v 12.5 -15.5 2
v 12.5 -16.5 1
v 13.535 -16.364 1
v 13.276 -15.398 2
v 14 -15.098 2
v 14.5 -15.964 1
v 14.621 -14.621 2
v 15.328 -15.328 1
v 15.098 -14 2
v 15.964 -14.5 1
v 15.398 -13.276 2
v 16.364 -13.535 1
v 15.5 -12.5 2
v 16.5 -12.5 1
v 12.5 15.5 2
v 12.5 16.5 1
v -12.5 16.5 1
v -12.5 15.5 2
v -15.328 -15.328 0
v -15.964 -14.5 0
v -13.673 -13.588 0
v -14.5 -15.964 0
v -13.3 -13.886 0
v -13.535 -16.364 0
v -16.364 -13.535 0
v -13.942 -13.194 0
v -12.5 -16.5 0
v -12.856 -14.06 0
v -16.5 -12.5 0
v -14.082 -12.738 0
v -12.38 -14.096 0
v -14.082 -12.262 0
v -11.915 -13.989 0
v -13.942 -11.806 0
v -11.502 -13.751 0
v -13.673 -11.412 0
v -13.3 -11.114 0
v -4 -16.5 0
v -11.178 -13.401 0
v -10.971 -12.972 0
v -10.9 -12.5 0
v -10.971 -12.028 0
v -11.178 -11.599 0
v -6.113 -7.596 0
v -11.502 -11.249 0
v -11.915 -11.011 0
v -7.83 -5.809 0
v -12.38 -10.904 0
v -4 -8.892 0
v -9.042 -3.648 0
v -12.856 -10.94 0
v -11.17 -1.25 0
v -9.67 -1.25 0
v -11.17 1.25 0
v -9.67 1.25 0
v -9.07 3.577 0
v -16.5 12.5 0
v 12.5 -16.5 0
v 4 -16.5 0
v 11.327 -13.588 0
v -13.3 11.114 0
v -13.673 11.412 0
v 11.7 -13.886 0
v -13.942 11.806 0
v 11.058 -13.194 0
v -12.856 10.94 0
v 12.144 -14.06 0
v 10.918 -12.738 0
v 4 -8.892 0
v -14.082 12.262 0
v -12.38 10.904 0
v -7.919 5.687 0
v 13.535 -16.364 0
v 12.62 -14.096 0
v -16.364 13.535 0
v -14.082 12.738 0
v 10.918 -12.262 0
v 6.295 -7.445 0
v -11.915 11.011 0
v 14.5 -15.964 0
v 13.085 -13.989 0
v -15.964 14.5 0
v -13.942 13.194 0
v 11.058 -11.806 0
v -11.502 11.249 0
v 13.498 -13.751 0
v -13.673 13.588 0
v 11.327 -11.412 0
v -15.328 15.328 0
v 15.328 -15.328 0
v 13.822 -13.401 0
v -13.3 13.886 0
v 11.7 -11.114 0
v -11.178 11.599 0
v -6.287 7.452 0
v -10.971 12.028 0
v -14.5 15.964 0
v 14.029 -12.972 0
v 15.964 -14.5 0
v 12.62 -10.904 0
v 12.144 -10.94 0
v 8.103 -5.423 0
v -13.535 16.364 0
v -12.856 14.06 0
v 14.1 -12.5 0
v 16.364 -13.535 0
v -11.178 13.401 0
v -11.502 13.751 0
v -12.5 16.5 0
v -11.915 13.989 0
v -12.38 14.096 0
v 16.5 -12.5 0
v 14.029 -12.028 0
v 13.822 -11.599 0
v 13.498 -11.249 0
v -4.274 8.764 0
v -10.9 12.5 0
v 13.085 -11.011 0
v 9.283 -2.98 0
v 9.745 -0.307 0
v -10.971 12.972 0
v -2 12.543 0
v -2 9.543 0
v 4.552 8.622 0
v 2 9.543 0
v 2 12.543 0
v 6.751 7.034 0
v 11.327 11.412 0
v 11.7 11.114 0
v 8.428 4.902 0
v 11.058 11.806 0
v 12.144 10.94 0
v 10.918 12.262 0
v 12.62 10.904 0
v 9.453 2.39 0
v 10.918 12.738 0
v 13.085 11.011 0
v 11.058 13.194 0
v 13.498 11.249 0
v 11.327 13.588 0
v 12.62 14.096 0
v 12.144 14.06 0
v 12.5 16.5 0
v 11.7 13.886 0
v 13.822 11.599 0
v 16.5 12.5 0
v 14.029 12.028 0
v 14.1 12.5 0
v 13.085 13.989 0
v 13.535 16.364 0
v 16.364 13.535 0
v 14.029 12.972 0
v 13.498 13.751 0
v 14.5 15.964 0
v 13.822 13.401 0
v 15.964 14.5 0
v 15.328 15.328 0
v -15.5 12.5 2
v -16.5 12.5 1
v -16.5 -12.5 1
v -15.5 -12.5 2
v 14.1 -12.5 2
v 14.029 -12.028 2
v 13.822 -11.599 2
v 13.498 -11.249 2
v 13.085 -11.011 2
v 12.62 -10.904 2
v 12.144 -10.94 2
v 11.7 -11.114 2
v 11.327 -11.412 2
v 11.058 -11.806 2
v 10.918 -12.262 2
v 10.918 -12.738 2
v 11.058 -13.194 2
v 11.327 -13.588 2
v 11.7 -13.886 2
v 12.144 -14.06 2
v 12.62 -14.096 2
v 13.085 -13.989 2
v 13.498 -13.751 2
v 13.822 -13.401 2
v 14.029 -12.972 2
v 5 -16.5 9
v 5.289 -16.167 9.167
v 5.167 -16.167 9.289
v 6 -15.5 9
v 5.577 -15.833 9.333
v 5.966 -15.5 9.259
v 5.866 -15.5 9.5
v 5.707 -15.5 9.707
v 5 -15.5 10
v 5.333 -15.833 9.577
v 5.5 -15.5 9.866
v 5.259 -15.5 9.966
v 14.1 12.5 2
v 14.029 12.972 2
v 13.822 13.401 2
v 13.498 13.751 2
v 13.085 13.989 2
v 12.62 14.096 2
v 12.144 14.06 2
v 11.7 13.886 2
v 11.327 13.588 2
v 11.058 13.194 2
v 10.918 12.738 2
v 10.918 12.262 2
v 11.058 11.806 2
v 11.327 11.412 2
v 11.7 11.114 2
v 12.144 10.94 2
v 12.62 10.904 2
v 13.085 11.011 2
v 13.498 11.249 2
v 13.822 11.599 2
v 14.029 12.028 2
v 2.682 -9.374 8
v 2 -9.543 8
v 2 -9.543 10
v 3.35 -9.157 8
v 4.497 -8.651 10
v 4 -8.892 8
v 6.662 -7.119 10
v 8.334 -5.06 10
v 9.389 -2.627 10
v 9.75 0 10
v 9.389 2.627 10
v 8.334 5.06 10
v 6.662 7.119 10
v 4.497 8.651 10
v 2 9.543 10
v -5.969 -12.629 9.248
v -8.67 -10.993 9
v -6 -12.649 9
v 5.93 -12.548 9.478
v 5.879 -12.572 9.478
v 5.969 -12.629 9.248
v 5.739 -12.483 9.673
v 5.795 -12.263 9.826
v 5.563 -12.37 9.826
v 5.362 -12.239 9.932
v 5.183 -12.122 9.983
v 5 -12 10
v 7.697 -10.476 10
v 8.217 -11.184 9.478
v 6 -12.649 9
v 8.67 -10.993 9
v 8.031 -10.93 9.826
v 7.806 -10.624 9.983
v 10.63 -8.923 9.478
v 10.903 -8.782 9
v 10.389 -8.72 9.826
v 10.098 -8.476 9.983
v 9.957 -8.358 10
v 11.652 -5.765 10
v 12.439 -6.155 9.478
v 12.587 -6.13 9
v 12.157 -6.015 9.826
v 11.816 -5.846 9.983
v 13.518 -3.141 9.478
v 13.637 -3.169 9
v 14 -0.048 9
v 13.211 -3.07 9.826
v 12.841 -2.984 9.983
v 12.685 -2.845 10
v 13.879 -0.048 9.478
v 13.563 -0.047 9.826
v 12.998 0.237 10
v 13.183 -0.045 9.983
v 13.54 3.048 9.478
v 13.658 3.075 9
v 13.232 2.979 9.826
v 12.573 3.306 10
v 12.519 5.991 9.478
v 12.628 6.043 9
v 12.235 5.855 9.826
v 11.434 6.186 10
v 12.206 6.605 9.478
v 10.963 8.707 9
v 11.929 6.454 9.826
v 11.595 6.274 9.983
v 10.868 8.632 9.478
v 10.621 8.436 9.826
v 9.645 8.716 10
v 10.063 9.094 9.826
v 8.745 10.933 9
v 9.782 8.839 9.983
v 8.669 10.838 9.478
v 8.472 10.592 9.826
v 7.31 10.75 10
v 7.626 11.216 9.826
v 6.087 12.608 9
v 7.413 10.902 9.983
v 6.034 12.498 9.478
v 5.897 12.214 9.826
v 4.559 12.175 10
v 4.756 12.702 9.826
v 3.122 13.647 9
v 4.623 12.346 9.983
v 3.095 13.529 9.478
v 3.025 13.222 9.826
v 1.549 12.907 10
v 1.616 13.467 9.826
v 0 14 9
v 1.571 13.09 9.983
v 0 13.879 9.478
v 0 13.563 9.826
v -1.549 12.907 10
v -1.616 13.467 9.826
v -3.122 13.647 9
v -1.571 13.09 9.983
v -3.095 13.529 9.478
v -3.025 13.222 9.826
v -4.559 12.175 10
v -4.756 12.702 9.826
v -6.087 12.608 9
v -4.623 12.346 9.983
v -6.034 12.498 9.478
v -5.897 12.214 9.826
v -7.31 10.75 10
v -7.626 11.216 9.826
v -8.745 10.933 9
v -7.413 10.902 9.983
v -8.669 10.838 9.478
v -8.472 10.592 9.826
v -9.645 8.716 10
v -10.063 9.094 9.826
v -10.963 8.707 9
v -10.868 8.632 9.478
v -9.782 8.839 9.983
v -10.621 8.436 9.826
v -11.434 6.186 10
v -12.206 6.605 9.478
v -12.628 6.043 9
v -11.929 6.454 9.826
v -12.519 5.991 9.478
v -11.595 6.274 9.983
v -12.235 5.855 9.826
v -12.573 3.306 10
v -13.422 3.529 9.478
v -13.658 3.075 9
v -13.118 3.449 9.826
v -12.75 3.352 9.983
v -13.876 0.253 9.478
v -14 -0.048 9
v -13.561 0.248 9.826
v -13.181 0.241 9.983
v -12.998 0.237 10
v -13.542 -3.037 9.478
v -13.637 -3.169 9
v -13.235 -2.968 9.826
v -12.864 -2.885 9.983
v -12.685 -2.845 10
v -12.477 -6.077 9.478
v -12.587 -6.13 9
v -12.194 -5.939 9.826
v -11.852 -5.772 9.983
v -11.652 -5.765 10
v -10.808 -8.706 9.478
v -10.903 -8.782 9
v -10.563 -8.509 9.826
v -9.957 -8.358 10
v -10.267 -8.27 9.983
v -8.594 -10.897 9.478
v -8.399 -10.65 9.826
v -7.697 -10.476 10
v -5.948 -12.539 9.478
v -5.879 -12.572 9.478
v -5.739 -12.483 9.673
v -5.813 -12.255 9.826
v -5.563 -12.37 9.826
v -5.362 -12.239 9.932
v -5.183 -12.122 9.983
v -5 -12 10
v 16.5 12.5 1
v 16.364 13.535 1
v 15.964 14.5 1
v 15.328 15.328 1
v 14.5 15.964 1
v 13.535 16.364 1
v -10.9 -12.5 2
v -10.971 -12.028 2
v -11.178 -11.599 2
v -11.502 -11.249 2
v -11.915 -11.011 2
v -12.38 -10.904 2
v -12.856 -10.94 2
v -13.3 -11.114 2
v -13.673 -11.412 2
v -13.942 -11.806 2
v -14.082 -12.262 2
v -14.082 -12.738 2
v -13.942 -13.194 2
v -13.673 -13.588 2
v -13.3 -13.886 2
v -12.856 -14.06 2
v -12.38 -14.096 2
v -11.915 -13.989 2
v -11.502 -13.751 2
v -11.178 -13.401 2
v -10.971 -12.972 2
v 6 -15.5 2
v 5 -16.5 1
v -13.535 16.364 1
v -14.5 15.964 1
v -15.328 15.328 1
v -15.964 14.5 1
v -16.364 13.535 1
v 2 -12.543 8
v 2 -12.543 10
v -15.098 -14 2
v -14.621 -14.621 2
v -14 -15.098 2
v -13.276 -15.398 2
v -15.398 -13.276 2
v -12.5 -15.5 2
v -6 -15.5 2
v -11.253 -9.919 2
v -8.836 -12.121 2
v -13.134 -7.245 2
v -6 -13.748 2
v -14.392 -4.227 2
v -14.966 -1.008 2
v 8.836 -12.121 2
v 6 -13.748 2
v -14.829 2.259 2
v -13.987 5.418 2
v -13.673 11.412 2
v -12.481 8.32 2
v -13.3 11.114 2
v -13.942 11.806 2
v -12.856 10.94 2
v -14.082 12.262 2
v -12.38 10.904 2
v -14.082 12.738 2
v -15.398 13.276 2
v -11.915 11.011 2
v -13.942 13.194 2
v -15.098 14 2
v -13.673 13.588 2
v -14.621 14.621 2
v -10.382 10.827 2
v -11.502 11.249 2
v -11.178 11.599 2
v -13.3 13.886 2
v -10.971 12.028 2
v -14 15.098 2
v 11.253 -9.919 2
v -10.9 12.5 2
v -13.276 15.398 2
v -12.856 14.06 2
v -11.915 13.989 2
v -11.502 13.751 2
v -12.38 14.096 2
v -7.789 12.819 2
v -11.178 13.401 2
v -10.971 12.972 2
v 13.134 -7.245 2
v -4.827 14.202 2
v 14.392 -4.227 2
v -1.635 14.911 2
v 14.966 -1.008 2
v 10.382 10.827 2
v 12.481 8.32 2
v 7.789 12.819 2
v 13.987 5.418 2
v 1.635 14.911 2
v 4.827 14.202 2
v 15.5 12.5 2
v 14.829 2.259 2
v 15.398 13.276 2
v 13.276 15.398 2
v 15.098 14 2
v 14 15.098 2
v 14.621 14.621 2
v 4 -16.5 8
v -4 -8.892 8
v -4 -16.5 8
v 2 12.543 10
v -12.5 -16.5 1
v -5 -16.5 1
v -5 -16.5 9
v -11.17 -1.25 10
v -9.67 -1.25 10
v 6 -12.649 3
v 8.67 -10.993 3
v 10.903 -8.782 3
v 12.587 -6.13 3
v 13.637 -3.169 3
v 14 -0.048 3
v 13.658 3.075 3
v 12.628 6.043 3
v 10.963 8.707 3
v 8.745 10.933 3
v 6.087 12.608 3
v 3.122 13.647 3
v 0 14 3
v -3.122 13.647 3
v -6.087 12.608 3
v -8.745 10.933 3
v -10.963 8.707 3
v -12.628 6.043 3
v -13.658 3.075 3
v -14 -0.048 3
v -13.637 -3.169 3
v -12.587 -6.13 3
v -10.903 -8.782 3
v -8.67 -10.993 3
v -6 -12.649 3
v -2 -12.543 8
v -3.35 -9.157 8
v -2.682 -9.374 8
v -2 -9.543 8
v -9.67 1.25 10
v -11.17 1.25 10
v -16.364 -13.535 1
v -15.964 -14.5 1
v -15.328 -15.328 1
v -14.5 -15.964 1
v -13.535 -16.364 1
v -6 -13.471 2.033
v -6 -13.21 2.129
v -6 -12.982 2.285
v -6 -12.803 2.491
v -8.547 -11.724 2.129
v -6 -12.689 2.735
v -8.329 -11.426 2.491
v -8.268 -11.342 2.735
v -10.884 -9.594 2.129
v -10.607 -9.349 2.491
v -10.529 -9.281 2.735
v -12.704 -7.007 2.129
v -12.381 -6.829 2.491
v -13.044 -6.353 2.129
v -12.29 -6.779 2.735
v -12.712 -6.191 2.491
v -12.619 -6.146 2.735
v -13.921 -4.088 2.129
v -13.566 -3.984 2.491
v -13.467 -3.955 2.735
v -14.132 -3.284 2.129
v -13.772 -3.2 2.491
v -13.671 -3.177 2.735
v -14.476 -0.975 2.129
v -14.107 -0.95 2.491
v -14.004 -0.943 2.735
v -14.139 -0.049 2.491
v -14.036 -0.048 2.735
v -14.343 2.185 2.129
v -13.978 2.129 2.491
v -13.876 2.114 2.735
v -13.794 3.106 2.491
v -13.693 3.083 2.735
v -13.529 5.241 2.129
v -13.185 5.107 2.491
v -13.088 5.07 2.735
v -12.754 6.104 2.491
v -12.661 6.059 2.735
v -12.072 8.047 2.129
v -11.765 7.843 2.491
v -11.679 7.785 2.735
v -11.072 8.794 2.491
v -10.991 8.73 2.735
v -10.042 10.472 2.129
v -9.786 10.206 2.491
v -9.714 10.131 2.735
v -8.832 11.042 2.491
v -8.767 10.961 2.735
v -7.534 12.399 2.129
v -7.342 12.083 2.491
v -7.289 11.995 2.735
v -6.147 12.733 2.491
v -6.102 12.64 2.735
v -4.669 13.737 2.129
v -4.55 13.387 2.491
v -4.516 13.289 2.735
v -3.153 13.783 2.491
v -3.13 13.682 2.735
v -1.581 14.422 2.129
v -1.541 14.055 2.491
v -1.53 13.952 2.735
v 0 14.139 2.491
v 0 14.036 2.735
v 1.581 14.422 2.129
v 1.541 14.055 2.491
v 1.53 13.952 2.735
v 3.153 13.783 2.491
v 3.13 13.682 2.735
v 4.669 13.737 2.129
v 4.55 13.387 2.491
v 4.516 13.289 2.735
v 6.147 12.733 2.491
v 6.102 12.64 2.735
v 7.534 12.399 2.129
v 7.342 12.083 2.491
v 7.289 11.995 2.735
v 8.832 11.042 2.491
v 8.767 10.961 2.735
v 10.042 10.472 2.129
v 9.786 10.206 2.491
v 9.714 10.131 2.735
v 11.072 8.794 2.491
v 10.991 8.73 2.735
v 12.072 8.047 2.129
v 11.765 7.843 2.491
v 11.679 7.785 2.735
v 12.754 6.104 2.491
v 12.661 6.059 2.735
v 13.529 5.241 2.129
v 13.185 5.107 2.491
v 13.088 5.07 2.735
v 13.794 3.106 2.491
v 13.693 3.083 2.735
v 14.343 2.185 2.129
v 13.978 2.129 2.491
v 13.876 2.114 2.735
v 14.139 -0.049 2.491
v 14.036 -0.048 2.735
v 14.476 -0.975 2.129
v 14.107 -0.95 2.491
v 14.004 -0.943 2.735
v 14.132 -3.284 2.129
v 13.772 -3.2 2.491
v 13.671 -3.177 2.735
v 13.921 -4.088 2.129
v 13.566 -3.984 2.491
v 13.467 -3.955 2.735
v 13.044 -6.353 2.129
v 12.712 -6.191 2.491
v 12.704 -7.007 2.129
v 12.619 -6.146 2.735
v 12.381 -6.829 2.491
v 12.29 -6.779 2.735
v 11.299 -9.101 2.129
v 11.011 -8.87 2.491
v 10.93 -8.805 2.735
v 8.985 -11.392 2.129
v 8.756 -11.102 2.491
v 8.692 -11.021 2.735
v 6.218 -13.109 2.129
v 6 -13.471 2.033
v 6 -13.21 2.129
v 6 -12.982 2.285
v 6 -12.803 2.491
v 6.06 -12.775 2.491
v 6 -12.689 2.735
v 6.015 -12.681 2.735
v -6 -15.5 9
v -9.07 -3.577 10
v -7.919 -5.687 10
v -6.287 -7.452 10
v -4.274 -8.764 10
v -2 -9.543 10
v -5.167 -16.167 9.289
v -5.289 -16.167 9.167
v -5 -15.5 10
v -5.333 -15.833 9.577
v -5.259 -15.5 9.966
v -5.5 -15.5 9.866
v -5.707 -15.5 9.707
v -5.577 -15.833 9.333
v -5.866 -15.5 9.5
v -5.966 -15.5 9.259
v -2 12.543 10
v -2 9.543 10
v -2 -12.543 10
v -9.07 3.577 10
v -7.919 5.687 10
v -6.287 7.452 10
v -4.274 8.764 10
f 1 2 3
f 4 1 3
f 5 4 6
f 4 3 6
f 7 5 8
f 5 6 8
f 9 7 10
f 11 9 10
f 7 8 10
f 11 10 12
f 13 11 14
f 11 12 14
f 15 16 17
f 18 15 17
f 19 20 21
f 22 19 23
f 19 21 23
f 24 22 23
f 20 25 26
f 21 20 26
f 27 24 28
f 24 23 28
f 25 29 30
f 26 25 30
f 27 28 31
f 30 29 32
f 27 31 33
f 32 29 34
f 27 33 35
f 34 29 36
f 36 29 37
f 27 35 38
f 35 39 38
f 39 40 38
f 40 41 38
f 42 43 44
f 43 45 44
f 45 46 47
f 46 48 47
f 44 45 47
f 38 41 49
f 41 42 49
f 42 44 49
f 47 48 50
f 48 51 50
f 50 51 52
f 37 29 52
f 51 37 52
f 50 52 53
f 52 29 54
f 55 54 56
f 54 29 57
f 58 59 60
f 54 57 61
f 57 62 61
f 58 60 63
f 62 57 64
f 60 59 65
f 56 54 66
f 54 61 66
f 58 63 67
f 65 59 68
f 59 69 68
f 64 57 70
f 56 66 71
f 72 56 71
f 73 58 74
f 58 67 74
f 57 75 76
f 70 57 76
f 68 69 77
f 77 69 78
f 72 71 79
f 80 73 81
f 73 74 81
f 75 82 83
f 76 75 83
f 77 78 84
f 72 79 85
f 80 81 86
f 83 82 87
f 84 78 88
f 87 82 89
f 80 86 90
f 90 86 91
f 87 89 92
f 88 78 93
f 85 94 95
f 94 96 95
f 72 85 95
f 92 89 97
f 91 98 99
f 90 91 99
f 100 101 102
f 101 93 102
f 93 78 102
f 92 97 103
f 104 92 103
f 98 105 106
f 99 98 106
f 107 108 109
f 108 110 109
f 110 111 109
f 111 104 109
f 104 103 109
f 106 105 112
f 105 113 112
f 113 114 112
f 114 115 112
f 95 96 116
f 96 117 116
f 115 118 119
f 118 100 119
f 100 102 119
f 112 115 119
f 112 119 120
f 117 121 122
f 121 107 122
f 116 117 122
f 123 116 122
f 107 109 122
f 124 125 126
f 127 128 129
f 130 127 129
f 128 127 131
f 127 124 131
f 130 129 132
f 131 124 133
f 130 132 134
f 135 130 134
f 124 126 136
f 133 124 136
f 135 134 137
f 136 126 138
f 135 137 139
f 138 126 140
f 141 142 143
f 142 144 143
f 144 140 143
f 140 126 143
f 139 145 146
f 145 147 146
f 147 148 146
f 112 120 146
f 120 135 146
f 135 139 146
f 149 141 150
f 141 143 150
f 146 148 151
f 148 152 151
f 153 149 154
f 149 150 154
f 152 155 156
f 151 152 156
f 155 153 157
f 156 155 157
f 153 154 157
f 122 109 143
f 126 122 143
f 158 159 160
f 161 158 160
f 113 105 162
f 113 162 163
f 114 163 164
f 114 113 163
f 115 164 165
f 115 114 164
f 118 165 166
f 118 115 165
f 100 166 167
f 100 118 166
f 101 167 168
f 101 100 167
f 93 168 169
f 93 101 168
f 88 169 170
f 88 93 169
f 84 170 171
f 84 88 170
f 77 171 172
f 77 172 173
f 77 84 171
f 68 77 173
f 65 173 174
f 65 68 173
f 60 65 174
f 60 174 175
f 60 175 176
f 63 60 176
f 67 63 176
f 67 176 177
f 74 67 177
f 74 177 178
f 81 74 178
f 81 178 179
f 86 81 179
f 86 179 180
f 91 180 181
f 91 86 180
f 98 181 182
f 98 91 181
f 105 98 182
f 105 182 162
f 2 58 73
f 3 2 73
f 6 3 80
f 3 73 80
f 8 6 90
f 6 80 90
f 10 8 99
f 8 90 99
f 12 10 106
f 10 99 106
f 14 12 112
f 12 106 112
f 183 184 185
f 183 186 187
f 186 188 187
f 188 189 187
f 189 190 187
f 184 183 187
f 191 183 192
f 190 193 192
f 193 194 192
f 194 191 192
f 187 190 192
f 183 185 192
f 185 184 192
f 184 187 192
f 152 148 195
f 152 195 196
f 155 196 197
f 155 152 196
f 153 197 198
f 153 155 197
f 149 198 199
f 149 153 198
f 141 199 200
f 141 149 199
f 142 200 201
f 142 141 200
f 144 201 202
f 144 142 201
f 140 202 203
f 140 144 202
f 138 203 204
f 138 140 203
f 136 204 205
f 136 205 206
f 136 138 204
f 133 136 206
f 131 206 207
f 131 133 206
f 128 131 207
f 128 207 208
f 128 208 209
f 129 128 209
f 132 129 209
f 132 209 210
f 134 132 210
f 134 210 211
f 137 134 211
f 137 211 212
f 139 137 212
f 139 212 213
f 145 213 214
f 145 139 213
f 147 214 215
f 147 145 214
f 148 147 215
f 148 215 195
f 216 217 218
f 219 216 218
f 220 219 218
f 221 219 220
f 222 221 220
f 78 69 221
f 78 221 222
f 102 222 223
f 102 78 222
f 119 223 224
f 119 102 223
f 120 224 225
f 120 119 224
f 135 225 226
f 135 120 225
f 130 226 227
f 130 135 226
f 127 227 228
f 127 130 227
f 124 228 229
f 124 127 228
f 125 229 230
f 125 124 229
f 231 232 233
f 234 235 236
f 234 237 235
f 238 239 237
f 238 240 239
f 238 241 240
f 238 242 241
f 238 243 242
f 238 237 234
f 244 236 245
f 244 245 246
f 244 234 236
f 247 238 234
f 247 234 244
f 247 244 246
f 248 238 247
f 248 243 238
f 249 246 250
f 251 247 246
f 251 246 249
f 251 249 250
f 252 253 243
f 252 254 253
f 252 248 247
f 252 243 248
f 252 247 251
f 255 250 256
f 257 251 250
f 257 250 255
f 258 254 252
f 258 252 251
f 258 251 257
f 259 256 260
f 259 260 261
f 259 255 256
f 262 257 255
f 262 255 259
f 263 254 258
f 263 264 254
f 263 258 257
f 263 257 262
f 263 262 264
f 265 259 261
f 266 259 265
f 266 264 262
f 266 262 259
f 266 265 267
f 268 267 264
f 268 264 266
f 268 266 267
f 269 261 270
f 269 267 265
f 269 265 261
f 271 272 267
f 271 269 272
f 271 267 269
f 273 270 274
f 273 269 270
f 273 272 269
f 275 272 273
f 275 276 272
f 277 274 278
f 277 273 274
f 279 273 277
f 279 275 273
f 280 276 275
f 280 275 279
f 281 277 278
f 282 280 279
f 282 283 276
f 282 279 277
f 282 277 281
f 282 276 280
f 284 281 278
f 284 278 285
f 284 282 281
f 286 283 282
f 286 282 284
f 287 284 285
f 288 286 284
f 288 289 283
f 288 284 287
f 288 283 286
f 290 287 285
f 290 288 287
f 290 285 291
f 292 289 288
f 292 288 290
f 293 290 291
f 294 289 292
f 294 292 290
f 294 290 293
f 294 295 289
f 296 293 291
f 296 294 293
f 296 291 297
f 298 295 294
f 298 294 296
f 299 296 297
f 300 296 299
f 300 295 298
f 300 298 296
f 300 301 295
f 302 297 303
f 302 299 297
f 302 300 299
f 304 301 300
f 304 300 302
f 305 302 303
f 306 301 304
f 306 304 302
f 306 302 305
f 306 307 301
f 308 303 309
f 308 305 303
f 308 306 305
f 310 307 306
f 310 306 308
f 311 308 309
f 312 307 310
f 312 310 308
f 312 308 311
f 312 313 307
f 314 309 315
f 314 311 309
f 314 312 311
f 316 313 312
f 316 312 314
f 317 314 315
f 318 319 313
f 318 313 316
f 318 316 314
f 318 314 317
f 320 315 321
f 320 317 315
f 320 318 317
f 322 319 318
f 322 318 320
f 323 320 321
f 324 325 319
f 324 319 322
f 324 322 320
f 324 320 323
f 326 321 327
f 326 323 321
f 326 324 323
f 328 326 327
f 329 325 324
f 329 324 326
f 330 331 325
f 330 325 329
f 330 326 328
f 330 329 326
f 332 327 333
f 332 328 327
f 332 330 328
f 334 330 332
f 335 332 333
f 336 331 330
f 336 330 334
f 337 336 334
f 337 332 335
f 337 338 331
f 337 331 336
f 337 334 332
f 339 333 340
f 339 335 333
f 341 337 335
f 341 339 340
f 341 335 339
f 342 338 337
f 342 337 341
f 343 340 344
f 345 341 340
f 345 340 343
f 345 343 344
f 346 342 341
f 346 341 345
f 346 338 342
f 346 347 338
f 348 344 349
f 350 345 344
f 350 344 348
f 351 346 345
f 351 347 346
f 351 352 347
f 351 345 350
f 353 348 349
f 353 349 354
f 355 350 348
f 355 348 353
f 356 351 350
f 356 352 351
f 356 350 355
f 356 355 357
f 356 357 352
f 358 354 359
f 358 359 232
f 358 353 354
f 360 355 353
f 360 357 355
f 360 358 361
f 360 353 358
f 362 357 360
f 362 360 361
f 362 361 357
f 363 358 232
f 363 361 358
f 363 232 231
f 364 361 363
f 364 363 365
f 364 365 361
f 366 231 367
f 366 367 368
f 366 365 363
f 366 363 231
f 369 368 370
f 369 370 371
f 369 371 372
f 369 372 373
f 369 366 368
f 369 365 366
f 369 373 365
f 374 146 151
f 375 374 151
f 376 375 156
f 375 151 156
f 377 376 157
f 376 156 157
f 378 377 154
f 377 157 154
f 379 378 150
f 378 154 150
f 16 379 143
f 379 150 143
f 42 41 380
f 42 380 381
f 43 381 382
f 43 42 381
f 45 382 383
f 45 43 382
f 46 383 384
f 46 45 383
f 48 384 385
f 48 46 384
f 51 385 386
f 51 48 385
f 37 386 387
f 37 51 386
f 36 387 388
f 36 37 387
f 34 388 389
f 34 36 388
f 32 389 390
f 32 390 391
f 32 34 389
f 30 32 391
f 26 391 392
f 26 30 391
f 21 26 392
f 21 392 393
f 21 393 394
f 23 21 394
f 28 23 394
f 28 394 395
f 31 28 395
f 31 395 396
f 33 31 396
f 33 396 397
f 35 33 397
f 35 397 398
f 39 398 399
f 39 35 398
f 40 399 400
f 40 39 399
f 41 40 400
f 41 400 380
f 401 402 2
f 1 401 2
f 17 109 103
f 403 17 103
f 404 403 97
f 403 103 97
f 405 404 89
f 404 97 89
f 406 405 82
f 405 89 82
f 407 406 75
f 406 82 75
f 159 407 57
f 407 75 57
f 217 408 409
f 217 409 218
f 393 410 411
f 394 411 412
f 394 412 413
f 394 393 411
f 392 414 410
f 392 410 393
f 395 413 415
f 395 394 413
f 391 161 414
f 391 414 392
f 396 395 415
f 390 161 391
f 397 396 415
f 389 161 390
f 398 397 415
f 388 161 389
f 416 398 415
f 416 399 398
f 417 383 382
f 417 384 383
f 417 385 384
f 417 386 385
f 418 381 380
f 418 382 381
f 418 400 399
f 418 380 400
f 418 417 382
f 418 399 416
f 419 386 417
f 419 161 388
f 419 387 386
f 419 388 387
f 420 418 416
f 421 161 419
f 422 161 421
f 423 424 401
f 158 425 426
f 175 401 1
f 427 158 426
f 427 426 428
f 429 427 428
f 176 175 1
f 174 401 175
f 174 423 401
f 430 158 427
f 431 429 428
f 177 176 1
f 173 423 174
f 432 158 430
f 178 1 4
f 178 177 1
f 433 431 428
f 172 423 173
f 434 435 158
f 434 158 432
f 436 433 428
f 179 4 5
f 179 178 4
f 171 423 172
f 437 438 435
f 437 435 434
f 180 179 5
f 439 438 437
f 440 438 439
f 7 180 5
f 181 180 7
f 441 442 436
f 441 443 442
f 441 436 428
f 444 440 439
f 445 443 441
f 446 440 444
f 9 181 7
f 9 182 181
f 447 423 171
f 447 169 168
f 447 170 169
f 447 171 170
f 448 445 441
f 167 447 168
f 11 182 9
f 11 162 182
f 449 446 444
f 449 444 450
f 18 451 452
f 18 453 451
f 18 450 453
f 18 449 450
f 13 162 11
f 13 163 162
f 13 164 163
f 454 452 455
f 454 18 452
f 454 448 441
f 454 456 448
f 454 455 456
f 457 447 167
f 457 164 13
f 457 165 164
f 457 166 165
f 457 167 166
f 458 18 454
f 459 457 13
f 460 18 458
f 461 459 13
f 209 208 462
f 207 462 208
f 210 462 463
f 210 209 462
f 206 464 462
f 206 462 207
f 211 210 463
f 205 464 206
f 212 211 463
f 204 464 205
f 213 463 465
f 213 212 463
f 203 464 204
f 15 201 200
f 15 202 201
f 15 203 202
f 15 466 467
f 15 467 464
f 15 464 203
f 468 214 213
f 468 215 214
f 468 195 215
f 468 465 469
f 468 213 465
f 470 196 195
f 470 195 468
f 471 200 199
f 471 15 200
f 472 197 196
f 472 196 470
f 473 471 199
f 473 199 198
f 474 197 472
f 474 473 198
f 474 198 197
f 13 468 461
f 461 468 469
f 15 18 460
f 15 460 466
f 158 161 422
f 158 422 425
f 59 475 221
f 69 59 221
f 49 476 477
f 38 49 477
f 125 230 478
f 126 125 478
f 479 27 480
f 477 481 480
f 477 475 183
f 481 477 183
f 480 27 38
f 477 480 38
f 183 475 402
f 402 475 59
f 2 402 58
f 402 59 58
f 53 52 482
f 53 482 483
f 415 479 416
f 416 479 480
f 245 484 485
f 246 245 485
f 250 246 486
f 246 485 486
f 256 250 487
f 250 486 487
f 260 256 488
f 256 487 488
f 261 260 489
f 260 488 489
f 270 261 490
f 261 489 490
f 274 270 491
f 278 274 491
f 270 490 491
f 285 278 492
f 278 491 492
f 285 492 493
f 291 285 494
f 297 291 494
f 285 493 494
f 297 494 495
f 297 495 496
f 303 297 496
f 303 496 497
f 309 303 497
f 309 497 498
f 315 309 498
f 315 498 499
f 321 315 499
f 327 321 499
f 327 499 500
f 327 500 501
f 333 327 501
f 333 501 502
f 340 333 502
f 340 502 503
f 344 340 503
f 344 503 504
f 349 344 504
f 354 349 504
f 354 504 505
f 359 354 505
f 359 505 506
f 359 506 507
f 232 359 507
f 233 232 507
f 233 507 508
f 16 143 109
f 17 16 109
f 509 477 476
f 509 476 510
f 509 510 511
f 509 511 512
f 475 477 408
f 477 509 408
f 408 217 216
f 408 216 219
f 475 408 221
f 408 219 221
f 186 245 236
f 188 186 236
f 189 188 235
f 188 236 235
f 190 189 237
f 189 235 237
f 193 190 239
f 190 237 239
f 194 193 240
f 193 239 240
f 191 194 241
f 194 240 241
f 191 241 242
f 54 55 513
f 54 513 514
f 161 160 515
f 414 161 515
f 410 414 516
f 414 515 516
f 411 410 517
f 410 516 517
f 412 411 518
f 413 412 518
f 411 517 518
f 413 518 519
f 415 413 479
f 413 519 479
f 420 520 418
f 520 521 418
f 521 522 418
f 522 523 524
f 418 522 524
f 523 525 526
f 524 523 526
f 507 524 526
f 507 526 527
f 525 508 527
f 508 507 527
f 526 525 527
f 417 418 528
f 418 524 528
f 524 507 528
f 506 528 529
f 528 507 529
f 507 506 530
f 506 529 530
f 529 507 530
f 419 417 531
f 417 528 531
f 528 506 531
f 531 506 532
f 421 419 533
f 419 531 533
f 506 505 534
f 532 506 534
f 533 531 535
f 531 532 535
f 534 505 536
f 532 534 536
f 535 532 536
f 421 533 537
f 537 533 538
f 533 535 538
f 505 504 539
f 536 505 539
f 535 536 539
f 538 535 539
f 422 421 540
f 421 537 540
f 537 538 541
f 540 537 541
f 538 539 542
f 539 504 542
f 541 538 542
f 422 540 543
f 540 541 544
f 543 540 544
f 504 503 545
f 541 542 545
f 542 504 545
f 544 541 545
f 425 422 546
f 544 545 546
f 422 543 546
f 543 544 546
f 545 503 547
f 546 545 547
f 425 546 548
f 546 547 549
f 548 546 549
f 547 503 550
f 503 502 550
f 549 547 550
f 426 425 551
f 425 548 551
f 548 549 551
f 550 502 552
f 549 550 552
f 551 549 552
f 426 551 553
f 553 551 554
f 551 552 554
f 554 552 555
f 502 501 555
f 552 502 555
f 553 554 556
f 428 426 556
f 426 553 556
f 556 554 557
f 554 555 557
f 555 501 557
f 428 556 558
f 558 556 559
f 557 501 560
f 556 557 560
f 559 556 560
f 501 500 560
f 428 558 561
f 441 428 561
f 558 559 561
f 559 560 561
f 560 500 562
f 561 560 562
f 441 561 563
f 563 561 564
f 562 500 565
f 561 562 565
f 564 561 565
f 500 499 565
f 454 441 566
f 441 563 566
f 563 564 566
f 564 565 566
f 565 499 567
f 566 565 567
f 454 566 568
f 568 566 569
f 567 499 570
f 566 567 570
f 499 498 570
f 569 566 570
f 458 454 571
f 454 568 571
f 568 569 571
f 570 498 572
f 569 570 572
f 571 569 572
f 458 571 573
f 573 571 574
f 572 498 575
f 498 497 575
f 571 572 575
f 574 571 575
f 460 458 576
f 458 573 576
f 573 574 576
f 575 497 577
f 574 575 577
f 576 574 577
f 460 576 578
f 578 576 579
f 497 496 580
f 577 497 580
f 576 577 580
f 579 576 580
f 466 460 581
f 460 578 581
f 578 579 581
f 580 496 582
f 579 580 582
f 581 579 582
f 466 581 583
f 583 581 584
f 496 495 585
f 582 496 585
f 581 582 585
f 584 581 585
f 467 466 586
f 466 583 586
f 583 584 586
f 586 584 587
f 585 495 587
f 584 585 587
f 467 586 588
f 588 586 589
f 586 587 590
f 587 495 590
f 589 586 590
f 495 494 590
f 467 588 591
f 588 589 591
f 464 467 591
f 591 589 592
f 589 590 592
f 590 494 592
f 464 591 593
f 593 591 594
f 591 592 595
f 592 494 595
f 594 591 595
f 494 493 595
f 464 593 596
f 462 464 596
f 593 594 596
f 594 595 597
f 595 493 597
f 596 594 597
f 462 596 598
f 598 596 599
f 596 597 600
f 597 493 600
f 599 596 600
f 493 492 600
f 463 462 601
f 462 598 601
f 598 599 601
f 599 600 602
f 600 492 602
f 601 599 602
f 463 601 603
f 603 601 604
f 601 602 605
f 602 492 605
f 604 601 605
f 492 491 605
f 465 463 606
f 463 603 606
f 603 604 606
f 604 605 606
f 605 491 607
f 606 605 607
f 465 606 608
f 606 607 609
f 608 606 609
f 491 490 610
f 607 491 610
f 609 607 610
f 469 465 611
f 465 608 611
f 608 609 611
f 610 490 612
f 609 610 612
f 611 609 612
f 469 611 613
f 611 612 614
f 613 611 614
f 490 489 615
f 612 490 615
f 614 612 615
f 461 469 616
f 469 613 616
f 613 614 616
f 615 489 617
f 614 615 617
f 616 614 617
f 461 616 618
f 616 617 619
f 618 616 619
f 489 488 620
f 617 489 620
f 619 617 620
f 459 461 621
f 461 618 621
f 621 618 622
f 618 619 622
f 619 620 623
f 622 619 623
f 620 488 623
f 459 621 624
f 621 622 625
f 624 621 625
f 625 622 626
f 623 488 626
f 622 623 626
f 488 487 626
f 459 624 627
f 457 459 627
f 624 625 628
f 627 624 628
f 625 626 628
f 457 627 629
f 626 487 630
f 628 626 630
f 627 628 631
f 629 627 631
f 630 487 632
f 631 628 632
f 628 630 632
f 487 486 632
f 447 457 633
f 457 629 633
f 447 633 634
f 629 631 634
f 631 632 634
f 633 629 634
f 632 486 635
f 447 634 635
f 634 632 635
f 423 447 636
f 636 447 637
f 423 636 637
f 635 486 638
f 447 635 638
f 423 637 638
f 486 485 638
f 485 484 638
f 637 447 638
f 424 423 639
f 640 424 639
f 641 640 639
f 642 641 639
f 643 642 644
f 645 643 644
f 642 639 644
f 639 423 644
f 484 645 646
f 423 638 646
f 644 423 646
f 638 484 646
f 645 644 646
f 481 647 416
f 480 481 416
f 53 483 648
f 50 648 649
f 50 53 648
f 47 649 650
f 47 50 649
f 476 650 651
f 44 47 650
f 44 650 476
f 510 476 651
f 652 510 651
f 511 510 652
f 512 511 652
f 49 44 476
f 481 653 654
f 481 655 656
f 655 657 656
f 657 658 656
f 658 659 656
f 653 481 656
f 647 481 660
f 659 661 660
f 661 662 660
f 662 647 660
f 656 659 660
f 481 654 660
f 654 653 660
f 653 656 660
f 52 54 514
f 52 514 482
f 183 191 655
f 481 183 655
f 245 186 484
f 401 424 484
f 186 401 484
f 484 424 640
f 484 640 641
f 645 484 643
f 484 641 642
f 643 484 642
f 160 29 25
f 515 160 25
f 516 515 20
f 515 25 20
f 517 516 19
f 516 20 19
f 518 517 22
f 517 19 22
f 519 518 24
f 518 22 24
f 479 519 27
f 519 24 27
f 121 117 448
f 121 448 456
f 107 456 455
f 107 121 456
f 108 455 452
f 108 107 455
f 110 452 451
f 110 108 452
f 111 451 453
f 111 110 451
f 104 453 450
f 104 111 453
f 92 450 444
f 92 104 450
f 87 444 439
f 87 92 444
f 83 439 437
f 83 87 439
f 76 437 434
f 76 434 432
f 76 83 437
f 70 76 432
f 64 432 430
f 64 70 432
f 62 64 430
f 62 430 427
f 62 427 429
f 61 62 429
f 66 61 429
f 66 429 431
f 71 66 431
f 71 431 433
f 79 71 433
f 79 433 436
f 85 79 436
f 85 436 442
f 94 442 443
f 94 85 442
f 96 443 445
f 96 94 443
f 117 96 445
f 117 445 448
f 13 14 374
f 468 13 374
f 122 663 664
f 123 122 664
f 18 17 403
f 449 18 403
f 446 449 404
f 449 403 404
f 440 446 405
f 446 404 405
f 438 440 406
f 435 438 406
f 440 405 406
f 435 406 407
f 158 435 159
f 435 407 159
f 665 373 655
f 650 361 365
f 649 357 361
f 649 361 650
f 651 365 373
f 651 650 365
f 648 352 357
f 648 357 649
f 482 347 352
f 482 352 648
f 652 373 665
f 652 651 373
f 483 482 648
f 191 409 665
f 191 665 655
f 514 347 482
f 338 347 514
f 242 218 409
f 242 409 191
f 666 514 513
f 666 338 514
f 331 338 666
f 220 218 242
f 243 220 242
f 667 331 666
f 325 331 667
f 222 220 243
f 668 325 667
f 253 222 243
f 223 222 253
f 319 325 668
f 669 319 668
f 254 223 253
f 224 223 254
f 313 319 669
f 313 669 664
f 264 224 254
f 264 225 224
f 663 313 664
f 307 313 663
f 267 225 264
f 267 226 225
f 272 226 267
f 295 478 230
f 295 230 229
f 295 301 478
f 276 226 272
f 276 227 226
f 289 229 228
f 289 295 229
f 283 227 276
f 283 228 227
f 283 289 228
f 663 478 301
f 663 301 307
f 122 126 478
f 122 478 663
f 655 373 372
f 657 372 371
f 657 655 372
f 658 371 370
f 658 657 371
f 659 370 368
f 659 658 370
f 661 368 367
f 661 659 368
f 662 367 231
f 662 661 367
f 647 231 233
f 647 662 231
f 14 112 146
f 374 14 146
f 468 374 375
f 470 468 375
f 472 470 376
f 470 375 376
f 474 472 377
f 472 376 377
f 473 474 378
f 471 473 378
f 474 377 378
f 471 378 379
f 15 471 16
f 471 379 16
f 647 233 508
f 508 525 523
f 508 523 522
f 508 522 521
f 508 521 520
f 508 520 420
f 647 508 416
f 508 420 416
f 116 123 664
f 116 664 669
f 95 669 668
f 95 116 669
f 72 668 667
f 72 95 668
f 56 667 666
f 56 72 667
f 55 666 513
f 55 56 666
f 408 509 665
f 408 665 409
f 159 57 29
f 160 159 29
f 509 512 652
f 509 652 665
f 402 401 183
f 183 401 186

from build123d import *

# Parameters (mm, degrees)
SKETCH1_R           = 1.6
BOSS_EXTRUDE1_DEPTH = 2
BOSS_EXTRUDE3_DEPTH = 10
CUT_EXTRUDE2_DEPTH  = 26.38700455
CUT_EXTRUDE3_DEPTH  = 8
CHAMFER1_SIZE       = 1
FILLET4_R           = 1
CHAMFER2_SIZE       = 1


with BuildPart() as part:
    # Sketch1 → Boss-Extrude1 (new body)
    with BuildSketch(Plane.XY):
        with BuildLine():
            Line((-12.5, -16.5), (12.5, -16.5))
            ThreePointArc((12.5, -16.5), (15.328427125, -15.328427125), (16.5, -12.5))
            Line((16.5, -12.5), (16.5, 12.5))
            ThreePointArc((16.5, 12.5), (15.328427125, 15.328427125), (12.5, 16.5))
            Line((12.5, 16.5), (-12.5, 16.5))
            ThreePointArc((-12.5, 16.5), (-15.328427125, 15.328427125), (-16.5, 12.5))
            Line((-16.5, 12.5), (-16.5, -12.5))
            ThreePointArc((-16.5, -12.5), (-15.328427125, -15.328427125), (-12.5, -16.5))
        make_face()
        with Locations((-12.5, -12.5)):
            Circle(SKETCH1_R, mode=Mode.SUBTRACT)
        with Locations((12.5, -12.5)):
            Circle(SKETCH1_R, mode=Mode.SUBTRACT)
        with Locations((12.5, 12.5)):
            Circle(SKETCH1_R, mode=Mode.SUBTRACT)
        with Locations((-12.5, 12.5)):
            Circle(SKETCH1_R, mode=Mode.SUBTRACT)
    extrude(amount=BOSS_EXTRUDE1_DEPTH)

    # Sketch3 → Boss-Extrude3 (add)
    with BuildSketch(Plane.XY):
        with BuildLine():
            ThreePointArc((6, -12.649110641), (0, 14), (-6, -12.649110641))
            Line((-6, -12.649110641), (-6, -16.5))
            Line((-6, -16.5), (6, -16.5))
            Line((6, -16.5), (6, -12.649110641))
        make_face()
    extrude(amount=BOSS_EXTRUDE3_DEPTH)

    # Sketch3_3 → Cut-Extrude2 (cut, through all)
    with BuildSketch(Plane.XY):
        with BuildLine():
            Line((-11.169539803, -1.25), (-9.669539803, -1.25))
            ThreePointArc((-9.669539803, -1.25), (-7.15797616, -6.620111577), (-2, -9.542667342))
            Line((-2, -9.542667342), (-2, -12.542667342))
            Line((-2, -12.542667342), (2, -12.542667342))
            Line((2, -12.542667342), (2, -9.542667342))
            ThreePointArc((2, -9.542667342), (9.75, 0), (2, 9.542667342))
            Line((2, 9.542667342), (2, 12.542667342))
            Line((2, 12.542667342), (-2, 12.542667342))
            Line((-2, 12.542667342), (-2, 9.542667342))
            ThreePointArc((-2, 9.542667342), (-7.15797616, 6.620111577), (-9.669539803, 1.25))
            Line((-9.669539803, 1.25), (-11.169539803, 1.25))
            Line((-11.169539803, 1.25), (-11.169539803, -1.25))
        make_face()
    extrude(amount=CUT_EXTRUDE2_DEPTH, mode=Mode.SUBTRACT)

    # Sketch3_4 → Cut-Extrude3 (cut)
    with BuildSketch(Plane.XY):
        with BuildLine():
            ThreePointArc((-2, -9.542667342), (-3.017604429, -9.271276261), (-4, -8.891709622))
            Line((-4, -8.891709622), (-4, -16.5))
            Line((-4, -16.5), (4, -16.5))
            Line((4, -16.5), (4, -8.891709622))
            ThreePointArc((4, -8.891709622), (3.017604429, -9.271276261), (2, -9.542667342))
            Line((2, -9.542667342), (2, -12.542667342))
            Line((2, -12.542667342), (-2, -12.542667342))
            Line((-2, -12.542667342), (-2, -9.542667342))
        make_face()
    extrude(amount=CUT_EXTRUDE3_DEPTH, mode=Mode.SUBTRACT)

    # Chamfer1
    chamfer1_edges = [part.edges().sort_by_distance(p)[0] for p in [
        (-15.328427125, -15.328427125, 2),
        (-9.25, -16.5, 2),
        (15.328427125, -15.328427125, 2),
        (16.5, 0, 2),
        (15.328427125, 15.328427125, 2),
        (0, 16.5, 2),
        (9.25, -16.5, 2),
        (-15.328427125, 15.328427125, 2),
        (-16.5, 0, 2),
    ]]
    chamfer(chamfer1_edges, length=CHAMFER1_SIZE)

    # Fillet4
    fillet4_edges = [part.edges().sort_by_distance(p)[0] for p in [
        (0, 14, 2),
        (6, -14.57455532, 10),
        (0, 14, 10),
        (-6, -14.57455532, 10),
    ]]
    fillet(fillet4_edges, radius=FILLET4_R)

    # Chamfer2
    chamfer2_edges = [part.edges().sort_by_distance(p)[0] for p in [
        (-6, -16.5, 5),
        (6, -16.5, 5),
        (-5.707106781, -16.5, 9.707106781),
        (5.707106781, -16.5, 9.707106781),
        (0, -16.5, 10),
    ]]
    chamfer(chamfer2_edges, length=CHAMFER2_SIZE)


solid = part.part
